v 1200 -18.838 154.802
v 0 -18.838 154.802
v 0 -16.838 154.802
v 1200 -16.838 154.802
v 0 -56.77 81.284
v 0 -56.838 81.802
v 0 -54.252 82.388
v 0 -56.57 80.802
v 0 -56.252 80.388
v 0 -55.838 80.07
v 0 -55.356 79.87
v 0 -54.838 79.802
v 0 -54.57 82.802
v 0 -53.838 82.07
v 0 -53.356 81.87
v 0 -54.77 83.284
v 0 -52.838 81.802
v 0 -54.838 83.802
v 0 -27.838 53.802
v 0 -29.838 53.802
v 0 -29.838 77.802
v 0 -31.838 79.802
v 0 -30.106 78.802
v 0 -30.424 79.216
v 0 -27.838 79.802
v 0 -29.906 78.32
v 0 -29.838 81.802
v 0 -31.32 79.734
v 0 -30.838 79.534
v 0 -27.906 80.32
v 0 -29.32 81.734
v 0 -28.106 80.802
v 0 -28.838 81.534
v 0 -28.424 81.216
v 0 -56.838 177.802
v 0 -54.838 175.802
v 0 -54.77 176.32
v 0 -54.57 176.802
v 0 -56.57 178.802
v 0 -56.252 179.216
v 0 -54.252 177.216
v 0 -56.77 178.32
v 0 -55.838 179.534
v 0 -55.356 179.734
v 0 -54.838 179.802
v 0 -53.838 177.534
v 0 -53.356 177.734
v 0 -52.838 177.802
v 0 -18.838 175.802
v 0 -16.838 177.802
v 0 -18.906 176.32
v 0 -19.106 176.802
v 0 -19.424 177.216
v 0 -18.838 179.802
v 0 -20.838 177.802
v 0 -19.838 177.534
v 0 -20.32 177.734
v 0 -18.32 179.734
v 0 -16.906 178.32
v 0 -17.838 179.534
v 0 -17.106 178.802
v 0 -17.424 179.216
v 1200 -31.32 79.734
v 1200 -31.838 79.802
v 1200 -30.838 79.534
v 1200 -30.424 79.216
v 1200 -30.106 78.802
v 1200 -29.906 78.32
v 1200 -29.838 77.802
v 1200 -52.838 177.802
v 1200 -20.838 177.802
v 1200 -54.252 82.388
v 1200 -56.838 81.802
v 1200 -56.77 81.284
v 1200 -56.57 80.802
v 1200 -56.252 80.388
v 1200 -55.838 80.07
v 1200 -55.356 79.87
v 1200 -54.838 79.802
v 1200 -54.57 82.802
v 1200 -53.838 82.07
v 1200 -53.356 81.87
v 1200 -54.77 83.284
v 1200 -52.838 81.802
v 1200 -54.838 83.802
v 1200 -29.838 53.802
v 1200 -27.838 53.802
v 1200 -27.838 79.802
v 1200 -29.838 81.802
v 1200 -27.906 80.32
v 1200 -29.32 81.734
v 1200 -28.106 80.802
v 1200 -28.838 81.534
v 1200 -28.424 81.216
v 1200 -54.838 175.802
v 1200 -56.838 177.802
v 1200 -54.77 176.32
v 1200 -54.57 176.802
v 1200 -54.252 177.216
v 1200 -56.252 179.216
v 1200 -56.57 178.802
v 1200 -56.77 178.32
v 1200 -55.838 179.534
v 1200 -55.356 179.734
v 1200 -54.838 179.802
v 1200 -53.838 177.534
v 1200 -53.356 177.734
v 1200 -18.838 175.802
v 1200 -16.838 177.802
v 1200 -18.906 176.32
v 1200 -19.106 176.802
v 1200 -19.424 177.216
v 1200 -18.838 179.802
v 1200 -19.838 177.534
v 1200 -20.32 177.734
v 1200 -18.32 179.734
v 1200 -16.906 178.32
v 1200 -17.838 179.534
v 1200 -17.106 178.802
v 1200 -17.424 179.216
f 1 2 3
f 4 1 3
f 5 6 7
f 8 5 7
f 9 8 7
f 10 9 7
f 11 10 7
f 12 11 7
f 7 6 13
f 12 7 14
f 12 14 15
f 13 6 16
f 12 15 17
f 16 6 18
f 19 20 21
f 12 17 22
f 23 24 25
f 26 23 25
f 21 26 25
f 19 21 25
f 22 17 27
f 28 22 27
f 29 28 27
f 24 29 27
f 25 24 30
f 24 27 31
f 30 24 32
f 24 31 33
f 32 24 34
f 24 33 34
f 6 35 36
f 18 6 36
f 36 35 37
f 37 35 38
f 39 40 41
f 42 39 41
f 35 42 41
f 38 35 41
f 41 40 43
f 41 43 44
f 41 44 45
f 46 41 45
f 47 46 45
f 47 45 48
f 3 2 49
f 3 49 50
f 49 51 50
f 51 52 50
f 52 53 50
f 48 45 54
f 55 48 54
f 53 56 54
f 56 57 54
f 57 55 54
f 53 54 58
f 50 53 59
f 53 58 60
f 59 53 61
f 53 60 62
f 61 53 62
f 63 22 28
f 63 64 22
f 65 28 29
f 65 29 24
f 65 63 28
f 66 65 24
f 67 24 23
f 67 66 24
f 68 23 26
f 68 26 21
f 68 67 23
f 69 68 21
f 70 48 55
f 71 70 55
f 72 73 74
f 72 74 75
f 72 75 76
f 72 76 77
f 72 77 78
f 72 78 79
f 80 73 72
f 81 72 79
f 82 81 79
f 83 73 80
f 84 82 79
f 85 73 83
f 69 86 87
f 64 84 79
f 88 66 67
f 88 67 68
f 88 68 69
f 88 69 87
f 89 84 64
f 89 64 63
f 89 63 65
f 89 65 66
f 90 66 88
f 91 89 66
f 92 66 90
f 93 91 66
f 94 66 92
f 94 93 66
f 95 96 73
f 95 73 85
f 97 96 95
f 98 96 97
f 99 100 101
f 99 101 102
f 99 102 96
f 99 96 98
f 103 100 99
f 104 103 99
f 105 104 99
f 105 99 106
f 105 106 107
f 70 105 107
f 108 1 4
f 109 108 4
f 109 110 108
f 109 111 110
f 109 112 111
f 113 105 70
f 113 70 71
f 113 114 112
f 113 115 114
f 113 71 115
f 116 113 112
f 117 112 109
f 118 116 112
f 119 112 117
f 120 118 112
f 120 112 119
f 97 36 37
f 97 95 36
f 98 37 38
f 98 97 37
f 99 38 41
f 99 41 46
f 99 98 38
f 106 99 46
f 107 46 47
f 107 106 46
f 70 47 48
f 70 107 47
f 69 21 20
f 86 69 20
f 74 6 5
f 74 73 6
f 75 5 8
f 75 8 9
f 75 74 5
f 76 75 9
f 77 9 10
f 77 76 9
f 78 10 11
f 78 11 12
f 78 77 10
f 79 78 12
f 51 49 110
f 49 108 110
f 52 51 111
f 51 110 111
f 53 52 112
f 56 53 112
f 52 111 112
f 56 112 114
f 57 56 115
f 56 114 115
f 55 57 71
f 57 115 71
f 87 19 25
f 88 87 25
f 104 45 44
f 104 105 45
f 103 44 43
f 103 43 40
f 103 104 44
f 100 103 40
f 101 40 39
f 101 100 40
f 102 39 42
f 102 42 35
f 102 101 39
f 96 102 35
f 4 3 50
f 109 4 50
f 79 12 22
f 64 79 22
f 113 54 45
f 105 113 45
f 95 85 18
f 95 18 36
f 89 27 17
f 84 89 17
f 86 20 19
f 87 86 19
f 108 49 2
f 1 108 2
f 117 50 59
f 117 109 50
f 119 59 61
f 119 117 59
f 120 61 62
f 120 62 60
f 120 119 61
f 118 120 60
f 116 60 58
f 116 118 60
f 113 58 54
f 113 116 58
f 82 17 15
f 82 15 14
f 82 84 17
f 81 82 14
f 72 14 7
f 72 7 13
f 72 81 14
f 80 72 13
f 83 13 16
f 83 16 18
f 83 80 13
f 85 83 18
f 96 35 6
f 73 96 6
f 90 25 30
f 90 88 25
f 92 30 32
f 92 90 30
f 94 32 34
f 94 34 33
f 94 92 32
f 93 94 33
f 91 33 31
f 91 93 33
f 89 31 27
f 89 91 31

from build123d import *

# Parameters (mm, degrees)
F1_DEPTH = 1200
F2_R     = 2


# Not quite as in the source:
# - a feature names something its author has since deleted; it is built from what else it names


with BuildPart() as f1:
    # F0 (on Right) → F1 (new body)
    with BuildSketch(Plane.YZ):
        Polygon((-18.8378913403, 177.8021101952), (-18.8378913403, 154.8021101952), (-16.8378913403, 154.8021101952), (-16.8378913403, 179.8021101952), (-56.8378913403, 179.8021101952), (-56.8378913403, 79.8021101952), (-29.8378913403, 79.8021101952), (-29.8378913403, 53.8021101952), (-27.8378913403, 53.8021101952), (-27.8378913403, 81.8021101952), (-54.8378913403, 81.8021101952), (-54.8378913403, 177.8021101952), align=None)
    extrude(amount=F1_DEPTH)

    # F2
    f2_edges = [f1.edges().sort_by_distance(p)[0] for p in [
        (600, -56.837891, 179.80211),
        (600, -16.837891, 179.80211),
        (600, -56.837891, 79.80211),
        (600, -27.837891, 81.80211),
        (600, -54.837891, 81.80211),
        (600, -29.837891, 79.80211),
        (600, -18.837891, 177.80211),
        (600, -54.837891, 177.80211),
    ]]
    fillet(f2_edges, radius=F2_R)


solid = f1.part
